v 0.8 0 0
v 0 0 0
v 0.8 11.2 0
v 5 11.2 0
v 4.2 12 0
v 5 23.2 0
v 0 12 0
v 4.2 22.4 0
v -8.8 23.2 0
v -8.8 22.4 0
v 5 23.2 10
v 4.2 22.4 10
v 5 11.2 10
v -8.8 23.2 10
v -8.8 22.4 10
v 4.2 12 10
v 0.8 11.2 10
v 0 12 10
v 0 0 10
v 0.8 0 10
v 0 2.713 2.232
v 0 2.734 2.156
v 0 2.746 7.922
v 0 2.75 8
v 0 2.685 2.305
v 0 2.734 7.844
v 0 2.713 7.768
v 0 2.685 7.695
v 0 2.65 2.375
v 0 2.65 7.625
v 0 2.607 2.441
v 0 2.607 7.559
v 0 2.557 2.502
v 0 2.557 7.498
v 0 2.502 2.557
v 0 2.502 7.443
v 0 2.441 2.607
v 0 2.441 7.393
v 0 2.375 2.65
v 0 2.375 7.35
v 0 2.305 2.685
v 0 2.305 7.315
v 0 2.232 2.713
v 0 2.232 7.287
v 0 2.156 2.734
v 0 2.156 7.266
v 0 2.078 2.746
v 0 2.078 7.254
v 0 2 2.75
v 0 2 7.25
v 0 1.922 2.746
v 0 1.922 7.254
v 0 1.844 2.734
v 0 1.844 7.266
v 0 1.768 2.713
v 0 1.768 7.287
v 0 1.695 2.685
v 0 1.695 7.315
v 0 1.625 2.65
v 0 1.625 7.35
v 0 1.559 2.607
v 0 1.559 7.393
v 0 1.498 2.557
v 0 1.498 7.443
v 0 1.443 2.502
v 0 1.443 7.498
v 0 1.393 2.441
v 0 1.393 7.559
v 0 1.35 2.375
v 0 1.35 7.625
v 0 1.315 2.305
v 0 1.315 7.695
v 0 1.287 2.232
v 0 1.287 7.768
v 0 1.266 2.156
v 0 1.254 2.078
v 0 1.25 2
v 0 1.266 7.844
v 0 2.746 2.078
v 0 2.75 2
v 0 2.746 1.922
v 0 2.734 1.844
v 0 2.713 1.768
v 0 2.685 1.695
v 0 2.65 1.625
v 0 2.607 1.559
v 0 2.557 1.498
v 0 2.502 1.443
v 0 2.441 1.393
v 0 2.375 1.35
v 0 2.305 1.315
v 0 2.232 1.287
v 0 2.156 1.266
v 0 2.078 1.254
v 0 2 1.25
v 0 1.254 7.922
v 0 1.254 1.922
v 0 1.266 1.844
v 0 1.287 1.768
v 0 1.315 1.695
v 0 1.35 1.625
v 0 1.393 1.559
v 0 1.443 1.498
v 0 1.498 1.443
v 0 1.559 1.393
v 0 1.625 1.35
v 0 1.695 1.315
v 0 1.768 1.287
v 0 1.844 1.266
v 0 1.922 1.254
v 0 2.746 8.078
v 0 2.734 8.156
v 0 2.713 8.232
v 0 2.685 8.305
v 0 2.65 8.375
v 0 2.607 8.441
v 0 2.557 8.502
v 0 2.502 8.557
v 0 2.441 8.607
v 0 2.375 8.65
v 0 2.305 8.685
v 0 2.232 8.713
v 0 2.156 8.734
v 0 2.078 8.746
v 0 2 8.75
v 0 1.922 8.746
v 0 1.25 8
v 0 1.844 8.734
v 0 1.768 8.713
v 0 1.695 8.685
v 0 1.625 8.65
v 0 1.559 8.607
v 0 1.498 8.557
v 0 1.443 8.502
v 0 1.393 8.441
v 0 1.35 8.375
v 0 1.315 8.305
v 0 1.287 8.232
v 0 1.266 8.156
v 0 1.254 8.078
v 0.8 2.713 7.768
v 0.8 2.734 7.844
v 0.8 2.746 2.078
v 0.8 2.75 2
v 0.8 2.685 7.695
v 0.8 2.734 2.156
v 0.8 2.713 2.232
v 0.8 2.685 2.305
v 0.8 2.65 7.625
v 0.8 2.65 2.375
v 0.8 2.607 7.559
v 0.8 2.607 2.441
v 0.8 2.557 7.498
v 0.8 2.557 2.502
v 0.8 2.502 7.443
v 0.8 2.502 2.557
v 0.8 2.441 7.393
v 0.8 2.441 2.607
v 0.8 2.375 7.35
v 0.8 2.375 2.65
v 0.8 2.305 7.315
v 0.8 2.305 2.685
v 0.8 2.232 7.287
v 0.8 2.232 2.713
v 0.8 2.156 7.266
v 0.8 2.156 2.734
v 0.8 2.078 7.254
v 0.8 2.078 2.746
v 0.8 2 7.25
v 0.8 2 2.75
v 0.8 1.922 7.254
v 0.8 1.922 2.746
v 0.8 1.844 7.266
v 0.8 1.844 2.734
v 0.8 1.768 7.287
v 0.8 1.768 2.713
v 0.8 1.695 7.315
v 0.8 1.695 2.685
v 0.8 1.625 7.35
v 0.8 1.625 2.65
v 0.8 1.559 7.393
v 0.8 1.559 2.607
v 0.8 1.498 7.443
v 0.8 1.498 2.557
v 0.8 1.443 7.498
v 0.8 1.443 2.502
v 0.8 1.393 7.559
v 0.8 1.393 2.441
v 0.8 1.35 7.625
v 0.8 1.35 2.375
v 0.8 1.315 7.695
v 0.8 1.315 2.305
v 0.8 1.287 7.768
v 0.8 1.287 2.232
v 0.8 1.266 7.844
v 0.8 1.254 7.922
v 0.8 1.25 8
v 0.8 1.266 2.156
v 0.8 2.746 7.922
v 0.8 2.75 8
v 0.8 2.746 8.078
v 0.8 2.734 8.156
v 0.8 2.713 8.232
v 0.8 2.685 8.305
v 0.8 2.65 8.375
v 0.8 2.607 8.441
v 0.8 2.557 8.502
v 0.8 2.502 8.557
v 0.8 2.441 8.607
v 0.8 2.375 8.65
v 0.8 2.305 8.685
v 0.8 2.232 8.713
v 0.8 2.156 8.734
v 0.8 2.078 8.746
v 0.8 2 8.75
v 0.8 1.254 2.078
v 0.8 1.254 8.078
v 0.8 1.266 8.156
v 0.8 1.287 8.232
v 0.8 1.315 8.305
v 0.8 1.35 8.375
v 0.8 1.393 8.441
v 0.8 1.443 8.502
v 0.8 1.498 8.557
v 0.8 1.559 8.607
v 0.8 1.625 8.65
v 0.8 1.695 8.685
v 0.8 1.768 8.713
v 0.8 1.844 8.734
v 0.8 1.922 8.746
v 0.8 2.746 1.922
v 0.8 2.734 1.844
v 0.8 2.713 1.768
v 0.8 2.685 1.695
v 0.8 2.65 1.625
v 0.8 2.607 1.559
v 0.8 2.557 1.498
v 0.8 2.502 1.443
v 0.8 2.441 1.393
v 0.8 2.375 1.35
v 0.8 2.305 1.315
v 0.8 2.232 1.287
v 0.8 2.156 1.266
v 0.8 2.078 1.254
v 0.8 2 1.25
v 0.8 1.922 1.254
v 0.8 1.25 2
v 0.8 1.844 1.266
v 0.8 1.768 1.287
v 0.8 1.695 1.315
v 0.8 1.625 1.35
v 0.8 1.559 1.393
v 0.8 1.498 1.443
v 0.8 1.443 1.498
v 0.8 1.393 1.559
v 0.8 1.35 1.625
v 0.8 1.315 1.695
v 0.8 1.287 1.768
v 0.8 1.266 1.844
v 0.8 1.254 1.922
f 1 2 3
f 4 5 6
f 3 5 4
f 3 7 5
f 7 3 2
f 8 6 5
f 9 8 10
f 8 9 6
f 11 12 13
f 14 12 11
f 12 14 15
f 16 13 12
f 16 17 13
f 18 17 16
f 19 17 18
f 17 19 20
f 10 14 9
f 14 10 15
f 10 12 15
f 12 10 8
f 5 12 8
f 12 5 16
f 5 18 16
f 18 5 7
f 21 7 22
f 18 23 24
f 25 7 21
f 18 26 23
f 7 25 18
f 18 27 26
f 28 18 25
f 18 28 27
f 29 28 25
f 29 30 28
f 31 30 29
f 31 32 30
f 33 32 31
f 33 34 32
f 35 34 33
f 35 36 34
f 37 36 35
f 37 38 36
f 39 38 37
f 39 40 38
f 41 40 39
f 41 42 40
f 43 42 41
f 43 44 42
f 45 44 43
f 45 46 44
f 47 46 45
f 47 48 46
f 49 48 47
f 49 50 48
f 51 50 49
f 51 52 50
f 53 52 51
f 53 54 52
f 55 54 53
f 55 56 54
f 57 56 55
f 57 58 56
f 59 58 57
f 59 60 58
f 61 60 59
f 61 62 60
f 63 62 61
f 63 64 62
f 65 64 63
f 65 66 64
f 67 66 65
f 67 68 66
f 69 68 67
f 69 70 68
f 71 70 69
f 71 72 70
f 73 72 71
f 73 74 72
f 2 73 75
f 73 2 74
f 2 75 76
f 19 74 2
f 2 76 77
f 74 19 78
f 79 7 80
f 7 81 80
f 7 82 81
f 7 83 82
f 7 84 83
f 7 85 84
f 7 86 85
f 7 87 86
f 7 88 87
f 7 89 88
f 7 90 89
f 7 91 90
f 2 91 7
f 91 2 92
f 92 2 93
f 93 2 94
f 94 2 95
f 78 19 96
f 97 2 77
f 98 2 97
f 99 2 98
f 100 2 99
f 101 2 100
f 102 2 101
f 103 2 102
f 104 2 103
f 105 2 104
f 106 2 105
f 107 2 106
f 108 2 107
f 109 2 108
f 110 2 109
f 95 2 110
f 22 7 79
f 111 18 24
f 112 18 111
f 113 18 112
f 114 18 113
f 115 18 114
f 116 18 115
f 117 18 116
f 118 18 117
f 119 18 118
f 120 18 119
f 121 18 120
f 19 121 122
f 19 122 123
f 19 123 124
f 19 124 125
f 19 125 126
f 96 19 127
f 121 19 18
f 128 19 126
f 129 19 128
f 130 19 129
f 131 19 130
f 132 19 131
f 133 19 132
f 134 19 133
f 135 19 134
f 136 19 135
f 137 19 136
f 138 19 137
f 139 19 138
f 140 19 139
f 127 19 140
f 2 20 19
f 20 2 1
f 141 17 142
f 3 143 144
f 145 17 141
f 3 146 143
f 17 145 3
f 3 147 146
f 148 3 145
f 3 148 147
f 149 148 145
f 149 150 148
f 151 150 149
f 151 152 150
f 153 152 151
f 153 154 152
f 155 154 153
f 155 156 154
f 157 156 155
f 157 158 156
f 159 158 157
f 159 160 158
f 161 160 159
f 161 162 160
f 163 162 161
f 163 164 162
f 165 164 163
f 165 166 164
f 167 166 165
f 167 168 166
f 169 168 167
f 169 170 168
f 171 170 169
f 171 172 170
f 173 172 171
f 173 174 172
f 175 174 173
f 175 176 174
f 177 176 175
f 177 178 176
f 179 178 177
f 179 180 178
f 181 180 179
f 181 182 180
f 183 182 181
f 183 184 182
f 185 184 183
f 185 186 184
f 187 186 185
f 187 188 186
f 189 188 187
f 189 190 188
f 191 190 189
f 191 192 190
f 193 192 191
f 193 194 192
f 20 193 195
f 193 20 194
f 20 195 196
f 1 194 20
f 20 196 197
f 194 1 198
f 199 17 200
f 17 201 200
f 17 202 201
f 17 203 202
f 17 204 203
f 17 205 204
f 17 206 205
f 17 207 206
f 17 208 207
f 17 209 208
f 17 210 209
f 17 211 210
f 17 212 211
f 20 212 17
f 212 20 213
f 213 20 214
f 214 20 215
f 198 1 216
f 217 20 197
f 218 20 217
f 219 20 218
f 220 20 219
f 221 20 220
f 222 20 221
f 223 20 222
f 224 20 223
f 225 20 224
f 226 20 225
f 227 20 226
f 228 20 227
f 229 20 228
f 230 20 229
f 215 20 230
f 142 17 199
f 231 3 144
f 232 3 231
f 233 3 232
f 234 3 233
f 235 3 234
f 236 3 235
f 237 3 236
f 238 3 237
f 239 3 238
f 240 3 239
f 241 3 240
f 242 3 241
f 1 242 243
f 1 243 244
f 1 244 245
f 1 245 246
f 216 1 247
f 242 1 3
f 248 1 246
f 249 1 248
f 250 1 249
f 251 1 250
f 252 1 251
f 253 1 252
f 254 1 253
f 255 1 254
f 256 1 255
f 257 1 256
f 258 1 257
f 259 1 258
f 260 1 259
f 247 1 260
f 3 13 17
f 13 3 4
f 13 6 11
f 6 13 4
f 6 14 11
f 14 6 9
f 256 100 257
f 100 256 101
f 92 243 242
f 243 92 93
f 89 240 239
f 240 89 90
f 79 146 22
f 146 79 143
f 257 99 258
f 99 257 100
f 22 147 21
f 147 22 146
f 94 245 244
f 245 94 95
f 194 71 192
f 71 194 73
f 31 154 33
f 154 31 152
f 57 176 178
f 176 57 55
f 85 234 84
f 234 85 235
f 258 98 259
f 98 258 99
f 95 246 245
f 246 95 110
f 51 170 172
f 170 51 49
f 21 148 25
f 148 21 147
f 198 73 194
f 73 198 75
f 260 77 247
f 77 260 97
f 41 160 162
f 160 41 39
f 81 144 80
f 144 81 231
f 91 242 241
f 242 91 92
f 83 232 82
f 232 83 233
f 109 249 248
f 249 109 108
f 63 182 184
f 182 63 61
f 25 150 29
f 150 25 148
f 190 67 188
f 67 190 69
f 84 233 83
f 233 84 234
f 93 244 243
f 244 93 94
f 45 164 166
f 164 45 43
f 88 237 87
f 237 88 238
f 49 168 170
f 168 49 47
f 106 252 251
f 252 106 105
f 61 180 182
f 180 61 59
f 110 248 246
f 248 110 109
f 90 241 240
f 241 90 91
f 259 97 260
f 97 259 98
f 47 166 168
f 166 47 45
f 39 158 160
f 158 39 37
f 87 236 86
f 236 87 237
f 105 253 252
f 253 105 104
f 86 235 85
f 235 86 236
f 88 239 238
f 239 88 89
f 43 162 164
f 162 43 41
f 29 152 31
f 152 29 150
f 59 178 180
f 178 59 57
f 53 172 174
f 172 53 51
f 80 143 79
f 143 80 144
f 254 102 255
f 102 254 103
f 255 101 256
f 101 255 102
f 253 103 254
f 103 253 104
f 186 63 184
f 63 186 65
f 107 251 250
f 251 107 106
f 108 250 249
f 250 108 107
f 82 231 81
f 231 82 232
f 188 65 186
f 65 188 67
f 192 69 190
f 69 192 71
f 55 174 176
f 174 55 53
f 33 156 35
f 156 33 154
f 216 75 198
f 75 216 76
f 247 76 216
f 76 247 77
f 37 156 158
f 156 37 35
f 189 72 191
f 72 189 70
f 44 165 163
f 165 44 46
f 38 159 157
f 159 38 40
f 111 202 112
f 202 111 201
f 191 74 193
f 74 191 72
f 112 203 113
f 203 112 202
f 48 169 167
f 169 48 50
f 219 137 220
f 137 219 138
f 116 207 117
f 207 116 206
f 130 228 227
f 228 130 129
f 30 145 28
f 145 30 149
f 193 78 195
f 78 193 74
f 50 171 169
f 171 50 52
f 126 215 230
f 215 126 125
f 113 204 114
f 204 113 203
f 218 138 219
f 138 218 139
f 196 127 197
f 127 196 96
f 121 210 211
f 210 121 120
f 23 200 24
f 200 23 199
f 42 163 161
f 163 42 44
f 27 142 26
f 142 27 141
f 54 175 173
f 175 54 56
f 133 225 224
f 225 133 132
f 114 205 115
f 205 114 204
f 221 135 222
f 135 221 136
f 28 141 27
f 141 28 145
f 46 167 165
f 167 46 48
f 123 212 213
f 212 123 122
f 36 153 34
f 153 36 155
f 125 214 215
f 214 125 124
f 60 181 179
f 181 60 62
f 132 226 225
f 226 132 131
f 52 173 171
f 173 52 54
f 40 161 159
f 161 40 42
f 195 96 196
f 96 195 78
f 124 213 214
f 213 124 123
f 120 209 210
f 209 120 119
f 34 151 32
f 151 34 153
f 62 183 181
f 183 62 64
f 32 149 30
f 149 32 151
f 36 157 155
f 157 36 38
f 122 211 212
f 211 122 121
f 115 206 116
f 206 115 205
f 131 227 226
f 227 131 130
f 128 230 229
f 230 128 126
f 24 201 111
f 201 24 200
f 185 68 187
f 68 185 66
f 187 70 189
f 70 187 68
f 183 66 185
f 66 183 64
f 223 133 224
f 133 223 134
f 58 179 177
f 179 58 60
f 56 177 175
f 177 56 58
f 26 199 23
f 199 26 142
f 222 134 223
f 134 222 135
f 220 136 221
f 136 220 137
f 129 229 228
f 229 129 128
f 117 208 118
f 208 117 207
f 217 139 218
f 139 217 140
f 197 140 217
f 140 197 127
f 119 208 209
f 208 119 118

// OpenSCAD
$fn=60;
length=135;
thickness=.8;
difference() {
    linear_extrude(10) {
        square([thickness,12]);
        translate([0,12-thickness,0]) square([5,thickness]);
        translate([5-thickness,12-thickness,0]) square([thickness,12]);
        translate([-13+5-thickness,24-thickness*2,0]) square([13,thickness]);
    }
    translate([-5,2,2]) rotate([0,90,0]) cylinder(d=1.5,h=10);
    translate([-5,2,8]) rotate([0,90,0]) cylinder(d=1.5,h=10);
}
